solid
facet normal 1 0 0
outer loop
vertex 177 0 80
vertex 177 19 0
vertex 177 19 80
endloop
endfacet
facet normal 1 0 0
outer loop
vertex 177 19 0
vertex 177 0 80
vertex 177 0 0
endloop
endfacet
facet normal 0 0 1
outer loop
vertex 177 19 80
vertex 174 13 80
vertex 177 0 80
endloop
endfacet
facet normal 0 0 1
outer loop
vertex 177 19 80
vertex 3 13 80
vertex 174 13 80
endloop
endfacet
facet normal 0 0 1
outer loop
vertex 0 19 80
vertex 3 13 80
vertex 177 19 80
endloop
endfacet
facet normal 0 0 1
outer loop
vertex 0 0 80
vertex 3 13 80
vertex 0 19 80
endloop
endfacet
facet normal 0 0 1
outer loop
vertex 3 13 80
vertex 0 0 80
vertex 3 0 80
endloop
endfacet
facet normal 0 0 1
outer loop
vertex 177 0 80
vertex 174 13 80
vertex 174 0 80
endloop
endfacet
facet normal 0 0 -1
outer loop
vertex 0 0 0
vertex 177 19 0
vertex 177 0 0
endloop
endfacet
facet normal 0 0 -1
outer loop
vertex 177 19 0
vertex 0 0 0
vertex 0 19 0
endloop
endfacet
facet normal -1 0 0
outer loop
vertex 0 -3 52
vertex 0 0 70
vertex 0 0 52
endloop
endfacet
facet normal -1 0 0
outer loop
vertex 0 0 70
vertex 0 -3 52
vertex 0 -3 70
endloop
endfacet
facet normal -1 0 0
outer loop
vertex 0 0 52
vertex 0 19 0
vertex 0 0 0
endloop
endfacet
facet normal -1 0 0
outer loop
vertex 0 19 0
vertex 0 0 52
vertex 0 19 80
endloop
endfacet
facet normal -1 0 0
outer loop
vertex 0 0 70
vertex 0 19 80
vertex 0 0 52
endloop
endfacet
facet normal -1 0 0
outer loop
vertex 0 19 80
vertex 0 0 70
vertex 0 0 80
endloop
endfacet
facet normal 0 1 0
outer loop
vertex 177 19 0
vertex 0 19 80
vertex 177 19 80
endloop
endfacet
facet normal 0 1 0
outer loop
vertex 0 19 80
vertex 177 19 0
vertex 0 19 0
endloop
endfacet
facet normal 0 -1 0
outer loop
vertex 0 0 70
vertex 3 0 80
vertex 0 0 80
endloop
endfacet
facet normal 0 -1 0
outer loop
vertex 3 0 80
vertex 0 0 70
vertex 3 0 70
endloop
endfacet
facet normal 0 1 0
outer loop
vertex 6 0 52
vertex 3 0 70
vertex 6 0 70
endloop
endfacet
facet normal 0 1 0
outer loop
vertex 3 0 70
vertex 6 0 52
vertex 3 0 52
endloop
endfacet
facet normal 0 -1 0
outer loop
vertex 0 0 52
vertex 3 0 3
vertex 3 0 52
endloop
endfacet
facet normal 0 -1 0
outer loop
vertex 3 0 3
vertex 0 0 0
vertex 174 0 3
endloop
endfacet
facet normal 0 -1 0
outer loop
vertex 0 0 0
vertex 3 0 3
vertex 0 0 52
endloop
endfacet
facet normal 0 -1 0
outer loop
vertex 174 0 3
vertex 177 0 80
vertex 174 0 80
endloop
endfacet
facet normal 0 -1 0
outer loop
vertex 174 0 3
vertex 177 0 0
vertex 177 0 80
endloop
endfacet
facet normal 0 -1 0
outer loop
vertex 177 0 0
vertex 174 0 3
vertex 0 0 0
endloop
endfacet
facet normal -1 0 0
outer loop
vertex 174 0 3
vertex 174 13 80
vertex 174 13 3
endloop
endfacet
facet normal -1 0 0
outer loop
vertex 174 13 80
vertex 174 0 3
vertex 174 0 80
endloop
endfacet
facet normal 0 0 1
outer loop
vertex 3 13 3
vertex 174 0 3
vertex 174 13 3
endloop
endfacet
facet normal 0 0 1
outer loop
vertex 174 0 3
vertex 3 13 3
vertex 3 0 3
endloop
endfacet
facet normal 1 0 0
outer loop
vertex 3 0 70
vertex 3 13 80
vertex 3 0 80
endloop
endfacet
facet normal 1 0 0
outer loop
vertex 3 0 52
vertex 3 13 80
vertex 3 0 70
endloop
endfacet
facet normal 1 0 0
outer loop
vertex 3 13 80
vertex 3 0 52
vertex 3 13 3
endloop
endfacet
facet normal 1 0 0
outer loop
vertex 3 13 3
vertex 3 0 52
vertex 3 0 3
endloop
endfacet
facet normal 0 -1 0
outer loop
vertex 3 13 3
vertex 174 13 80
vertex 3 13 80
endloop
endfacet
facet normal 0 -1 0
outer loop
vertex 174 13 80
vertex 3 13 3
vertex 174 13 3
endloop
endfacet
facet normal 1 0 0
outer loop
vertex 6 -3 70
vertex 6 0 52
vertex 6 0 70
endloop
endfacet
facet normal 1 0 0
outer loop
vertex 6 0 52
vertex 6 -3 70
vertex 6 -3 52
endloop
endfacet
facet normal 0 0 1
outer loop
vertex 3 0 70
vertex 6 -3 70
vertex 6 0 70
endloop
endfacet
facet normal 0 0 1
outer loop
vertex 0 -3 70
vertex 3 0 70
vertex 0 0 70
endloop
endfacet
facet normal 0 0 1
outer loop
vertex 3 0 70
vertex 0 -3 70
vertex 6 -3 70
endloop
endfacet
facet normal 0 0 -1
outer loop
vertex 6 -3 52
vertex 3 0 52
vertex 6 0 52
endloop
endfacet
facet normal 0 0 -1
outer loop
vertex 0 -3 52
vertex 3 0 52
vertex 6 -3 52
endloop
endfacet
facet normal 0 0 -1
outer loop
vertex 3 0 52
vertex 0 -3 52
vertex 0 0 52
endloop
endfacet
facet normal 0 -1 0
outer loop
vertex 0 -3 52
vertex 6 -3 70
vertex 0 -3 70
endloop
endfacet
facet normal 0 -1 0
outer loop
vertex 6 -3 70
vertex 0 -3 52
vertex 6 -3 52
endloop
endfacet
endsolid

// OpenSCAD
//Hoehe Handy
h=171;
//Breite Handy
b=77;
//Tiefe Handy
th=13;

//Thickness
t=3;

difference() {
    cube([h+t+t, th+t+t, b+t]);
    translate([t,0,t])
    color("gray")
    cube([h, th, b]);
}

ha=3;
hah=18;
haa=10;
translate([0,-t,b+t-hah-haa])
color("red")
cube([ha+t,t,hah]);
